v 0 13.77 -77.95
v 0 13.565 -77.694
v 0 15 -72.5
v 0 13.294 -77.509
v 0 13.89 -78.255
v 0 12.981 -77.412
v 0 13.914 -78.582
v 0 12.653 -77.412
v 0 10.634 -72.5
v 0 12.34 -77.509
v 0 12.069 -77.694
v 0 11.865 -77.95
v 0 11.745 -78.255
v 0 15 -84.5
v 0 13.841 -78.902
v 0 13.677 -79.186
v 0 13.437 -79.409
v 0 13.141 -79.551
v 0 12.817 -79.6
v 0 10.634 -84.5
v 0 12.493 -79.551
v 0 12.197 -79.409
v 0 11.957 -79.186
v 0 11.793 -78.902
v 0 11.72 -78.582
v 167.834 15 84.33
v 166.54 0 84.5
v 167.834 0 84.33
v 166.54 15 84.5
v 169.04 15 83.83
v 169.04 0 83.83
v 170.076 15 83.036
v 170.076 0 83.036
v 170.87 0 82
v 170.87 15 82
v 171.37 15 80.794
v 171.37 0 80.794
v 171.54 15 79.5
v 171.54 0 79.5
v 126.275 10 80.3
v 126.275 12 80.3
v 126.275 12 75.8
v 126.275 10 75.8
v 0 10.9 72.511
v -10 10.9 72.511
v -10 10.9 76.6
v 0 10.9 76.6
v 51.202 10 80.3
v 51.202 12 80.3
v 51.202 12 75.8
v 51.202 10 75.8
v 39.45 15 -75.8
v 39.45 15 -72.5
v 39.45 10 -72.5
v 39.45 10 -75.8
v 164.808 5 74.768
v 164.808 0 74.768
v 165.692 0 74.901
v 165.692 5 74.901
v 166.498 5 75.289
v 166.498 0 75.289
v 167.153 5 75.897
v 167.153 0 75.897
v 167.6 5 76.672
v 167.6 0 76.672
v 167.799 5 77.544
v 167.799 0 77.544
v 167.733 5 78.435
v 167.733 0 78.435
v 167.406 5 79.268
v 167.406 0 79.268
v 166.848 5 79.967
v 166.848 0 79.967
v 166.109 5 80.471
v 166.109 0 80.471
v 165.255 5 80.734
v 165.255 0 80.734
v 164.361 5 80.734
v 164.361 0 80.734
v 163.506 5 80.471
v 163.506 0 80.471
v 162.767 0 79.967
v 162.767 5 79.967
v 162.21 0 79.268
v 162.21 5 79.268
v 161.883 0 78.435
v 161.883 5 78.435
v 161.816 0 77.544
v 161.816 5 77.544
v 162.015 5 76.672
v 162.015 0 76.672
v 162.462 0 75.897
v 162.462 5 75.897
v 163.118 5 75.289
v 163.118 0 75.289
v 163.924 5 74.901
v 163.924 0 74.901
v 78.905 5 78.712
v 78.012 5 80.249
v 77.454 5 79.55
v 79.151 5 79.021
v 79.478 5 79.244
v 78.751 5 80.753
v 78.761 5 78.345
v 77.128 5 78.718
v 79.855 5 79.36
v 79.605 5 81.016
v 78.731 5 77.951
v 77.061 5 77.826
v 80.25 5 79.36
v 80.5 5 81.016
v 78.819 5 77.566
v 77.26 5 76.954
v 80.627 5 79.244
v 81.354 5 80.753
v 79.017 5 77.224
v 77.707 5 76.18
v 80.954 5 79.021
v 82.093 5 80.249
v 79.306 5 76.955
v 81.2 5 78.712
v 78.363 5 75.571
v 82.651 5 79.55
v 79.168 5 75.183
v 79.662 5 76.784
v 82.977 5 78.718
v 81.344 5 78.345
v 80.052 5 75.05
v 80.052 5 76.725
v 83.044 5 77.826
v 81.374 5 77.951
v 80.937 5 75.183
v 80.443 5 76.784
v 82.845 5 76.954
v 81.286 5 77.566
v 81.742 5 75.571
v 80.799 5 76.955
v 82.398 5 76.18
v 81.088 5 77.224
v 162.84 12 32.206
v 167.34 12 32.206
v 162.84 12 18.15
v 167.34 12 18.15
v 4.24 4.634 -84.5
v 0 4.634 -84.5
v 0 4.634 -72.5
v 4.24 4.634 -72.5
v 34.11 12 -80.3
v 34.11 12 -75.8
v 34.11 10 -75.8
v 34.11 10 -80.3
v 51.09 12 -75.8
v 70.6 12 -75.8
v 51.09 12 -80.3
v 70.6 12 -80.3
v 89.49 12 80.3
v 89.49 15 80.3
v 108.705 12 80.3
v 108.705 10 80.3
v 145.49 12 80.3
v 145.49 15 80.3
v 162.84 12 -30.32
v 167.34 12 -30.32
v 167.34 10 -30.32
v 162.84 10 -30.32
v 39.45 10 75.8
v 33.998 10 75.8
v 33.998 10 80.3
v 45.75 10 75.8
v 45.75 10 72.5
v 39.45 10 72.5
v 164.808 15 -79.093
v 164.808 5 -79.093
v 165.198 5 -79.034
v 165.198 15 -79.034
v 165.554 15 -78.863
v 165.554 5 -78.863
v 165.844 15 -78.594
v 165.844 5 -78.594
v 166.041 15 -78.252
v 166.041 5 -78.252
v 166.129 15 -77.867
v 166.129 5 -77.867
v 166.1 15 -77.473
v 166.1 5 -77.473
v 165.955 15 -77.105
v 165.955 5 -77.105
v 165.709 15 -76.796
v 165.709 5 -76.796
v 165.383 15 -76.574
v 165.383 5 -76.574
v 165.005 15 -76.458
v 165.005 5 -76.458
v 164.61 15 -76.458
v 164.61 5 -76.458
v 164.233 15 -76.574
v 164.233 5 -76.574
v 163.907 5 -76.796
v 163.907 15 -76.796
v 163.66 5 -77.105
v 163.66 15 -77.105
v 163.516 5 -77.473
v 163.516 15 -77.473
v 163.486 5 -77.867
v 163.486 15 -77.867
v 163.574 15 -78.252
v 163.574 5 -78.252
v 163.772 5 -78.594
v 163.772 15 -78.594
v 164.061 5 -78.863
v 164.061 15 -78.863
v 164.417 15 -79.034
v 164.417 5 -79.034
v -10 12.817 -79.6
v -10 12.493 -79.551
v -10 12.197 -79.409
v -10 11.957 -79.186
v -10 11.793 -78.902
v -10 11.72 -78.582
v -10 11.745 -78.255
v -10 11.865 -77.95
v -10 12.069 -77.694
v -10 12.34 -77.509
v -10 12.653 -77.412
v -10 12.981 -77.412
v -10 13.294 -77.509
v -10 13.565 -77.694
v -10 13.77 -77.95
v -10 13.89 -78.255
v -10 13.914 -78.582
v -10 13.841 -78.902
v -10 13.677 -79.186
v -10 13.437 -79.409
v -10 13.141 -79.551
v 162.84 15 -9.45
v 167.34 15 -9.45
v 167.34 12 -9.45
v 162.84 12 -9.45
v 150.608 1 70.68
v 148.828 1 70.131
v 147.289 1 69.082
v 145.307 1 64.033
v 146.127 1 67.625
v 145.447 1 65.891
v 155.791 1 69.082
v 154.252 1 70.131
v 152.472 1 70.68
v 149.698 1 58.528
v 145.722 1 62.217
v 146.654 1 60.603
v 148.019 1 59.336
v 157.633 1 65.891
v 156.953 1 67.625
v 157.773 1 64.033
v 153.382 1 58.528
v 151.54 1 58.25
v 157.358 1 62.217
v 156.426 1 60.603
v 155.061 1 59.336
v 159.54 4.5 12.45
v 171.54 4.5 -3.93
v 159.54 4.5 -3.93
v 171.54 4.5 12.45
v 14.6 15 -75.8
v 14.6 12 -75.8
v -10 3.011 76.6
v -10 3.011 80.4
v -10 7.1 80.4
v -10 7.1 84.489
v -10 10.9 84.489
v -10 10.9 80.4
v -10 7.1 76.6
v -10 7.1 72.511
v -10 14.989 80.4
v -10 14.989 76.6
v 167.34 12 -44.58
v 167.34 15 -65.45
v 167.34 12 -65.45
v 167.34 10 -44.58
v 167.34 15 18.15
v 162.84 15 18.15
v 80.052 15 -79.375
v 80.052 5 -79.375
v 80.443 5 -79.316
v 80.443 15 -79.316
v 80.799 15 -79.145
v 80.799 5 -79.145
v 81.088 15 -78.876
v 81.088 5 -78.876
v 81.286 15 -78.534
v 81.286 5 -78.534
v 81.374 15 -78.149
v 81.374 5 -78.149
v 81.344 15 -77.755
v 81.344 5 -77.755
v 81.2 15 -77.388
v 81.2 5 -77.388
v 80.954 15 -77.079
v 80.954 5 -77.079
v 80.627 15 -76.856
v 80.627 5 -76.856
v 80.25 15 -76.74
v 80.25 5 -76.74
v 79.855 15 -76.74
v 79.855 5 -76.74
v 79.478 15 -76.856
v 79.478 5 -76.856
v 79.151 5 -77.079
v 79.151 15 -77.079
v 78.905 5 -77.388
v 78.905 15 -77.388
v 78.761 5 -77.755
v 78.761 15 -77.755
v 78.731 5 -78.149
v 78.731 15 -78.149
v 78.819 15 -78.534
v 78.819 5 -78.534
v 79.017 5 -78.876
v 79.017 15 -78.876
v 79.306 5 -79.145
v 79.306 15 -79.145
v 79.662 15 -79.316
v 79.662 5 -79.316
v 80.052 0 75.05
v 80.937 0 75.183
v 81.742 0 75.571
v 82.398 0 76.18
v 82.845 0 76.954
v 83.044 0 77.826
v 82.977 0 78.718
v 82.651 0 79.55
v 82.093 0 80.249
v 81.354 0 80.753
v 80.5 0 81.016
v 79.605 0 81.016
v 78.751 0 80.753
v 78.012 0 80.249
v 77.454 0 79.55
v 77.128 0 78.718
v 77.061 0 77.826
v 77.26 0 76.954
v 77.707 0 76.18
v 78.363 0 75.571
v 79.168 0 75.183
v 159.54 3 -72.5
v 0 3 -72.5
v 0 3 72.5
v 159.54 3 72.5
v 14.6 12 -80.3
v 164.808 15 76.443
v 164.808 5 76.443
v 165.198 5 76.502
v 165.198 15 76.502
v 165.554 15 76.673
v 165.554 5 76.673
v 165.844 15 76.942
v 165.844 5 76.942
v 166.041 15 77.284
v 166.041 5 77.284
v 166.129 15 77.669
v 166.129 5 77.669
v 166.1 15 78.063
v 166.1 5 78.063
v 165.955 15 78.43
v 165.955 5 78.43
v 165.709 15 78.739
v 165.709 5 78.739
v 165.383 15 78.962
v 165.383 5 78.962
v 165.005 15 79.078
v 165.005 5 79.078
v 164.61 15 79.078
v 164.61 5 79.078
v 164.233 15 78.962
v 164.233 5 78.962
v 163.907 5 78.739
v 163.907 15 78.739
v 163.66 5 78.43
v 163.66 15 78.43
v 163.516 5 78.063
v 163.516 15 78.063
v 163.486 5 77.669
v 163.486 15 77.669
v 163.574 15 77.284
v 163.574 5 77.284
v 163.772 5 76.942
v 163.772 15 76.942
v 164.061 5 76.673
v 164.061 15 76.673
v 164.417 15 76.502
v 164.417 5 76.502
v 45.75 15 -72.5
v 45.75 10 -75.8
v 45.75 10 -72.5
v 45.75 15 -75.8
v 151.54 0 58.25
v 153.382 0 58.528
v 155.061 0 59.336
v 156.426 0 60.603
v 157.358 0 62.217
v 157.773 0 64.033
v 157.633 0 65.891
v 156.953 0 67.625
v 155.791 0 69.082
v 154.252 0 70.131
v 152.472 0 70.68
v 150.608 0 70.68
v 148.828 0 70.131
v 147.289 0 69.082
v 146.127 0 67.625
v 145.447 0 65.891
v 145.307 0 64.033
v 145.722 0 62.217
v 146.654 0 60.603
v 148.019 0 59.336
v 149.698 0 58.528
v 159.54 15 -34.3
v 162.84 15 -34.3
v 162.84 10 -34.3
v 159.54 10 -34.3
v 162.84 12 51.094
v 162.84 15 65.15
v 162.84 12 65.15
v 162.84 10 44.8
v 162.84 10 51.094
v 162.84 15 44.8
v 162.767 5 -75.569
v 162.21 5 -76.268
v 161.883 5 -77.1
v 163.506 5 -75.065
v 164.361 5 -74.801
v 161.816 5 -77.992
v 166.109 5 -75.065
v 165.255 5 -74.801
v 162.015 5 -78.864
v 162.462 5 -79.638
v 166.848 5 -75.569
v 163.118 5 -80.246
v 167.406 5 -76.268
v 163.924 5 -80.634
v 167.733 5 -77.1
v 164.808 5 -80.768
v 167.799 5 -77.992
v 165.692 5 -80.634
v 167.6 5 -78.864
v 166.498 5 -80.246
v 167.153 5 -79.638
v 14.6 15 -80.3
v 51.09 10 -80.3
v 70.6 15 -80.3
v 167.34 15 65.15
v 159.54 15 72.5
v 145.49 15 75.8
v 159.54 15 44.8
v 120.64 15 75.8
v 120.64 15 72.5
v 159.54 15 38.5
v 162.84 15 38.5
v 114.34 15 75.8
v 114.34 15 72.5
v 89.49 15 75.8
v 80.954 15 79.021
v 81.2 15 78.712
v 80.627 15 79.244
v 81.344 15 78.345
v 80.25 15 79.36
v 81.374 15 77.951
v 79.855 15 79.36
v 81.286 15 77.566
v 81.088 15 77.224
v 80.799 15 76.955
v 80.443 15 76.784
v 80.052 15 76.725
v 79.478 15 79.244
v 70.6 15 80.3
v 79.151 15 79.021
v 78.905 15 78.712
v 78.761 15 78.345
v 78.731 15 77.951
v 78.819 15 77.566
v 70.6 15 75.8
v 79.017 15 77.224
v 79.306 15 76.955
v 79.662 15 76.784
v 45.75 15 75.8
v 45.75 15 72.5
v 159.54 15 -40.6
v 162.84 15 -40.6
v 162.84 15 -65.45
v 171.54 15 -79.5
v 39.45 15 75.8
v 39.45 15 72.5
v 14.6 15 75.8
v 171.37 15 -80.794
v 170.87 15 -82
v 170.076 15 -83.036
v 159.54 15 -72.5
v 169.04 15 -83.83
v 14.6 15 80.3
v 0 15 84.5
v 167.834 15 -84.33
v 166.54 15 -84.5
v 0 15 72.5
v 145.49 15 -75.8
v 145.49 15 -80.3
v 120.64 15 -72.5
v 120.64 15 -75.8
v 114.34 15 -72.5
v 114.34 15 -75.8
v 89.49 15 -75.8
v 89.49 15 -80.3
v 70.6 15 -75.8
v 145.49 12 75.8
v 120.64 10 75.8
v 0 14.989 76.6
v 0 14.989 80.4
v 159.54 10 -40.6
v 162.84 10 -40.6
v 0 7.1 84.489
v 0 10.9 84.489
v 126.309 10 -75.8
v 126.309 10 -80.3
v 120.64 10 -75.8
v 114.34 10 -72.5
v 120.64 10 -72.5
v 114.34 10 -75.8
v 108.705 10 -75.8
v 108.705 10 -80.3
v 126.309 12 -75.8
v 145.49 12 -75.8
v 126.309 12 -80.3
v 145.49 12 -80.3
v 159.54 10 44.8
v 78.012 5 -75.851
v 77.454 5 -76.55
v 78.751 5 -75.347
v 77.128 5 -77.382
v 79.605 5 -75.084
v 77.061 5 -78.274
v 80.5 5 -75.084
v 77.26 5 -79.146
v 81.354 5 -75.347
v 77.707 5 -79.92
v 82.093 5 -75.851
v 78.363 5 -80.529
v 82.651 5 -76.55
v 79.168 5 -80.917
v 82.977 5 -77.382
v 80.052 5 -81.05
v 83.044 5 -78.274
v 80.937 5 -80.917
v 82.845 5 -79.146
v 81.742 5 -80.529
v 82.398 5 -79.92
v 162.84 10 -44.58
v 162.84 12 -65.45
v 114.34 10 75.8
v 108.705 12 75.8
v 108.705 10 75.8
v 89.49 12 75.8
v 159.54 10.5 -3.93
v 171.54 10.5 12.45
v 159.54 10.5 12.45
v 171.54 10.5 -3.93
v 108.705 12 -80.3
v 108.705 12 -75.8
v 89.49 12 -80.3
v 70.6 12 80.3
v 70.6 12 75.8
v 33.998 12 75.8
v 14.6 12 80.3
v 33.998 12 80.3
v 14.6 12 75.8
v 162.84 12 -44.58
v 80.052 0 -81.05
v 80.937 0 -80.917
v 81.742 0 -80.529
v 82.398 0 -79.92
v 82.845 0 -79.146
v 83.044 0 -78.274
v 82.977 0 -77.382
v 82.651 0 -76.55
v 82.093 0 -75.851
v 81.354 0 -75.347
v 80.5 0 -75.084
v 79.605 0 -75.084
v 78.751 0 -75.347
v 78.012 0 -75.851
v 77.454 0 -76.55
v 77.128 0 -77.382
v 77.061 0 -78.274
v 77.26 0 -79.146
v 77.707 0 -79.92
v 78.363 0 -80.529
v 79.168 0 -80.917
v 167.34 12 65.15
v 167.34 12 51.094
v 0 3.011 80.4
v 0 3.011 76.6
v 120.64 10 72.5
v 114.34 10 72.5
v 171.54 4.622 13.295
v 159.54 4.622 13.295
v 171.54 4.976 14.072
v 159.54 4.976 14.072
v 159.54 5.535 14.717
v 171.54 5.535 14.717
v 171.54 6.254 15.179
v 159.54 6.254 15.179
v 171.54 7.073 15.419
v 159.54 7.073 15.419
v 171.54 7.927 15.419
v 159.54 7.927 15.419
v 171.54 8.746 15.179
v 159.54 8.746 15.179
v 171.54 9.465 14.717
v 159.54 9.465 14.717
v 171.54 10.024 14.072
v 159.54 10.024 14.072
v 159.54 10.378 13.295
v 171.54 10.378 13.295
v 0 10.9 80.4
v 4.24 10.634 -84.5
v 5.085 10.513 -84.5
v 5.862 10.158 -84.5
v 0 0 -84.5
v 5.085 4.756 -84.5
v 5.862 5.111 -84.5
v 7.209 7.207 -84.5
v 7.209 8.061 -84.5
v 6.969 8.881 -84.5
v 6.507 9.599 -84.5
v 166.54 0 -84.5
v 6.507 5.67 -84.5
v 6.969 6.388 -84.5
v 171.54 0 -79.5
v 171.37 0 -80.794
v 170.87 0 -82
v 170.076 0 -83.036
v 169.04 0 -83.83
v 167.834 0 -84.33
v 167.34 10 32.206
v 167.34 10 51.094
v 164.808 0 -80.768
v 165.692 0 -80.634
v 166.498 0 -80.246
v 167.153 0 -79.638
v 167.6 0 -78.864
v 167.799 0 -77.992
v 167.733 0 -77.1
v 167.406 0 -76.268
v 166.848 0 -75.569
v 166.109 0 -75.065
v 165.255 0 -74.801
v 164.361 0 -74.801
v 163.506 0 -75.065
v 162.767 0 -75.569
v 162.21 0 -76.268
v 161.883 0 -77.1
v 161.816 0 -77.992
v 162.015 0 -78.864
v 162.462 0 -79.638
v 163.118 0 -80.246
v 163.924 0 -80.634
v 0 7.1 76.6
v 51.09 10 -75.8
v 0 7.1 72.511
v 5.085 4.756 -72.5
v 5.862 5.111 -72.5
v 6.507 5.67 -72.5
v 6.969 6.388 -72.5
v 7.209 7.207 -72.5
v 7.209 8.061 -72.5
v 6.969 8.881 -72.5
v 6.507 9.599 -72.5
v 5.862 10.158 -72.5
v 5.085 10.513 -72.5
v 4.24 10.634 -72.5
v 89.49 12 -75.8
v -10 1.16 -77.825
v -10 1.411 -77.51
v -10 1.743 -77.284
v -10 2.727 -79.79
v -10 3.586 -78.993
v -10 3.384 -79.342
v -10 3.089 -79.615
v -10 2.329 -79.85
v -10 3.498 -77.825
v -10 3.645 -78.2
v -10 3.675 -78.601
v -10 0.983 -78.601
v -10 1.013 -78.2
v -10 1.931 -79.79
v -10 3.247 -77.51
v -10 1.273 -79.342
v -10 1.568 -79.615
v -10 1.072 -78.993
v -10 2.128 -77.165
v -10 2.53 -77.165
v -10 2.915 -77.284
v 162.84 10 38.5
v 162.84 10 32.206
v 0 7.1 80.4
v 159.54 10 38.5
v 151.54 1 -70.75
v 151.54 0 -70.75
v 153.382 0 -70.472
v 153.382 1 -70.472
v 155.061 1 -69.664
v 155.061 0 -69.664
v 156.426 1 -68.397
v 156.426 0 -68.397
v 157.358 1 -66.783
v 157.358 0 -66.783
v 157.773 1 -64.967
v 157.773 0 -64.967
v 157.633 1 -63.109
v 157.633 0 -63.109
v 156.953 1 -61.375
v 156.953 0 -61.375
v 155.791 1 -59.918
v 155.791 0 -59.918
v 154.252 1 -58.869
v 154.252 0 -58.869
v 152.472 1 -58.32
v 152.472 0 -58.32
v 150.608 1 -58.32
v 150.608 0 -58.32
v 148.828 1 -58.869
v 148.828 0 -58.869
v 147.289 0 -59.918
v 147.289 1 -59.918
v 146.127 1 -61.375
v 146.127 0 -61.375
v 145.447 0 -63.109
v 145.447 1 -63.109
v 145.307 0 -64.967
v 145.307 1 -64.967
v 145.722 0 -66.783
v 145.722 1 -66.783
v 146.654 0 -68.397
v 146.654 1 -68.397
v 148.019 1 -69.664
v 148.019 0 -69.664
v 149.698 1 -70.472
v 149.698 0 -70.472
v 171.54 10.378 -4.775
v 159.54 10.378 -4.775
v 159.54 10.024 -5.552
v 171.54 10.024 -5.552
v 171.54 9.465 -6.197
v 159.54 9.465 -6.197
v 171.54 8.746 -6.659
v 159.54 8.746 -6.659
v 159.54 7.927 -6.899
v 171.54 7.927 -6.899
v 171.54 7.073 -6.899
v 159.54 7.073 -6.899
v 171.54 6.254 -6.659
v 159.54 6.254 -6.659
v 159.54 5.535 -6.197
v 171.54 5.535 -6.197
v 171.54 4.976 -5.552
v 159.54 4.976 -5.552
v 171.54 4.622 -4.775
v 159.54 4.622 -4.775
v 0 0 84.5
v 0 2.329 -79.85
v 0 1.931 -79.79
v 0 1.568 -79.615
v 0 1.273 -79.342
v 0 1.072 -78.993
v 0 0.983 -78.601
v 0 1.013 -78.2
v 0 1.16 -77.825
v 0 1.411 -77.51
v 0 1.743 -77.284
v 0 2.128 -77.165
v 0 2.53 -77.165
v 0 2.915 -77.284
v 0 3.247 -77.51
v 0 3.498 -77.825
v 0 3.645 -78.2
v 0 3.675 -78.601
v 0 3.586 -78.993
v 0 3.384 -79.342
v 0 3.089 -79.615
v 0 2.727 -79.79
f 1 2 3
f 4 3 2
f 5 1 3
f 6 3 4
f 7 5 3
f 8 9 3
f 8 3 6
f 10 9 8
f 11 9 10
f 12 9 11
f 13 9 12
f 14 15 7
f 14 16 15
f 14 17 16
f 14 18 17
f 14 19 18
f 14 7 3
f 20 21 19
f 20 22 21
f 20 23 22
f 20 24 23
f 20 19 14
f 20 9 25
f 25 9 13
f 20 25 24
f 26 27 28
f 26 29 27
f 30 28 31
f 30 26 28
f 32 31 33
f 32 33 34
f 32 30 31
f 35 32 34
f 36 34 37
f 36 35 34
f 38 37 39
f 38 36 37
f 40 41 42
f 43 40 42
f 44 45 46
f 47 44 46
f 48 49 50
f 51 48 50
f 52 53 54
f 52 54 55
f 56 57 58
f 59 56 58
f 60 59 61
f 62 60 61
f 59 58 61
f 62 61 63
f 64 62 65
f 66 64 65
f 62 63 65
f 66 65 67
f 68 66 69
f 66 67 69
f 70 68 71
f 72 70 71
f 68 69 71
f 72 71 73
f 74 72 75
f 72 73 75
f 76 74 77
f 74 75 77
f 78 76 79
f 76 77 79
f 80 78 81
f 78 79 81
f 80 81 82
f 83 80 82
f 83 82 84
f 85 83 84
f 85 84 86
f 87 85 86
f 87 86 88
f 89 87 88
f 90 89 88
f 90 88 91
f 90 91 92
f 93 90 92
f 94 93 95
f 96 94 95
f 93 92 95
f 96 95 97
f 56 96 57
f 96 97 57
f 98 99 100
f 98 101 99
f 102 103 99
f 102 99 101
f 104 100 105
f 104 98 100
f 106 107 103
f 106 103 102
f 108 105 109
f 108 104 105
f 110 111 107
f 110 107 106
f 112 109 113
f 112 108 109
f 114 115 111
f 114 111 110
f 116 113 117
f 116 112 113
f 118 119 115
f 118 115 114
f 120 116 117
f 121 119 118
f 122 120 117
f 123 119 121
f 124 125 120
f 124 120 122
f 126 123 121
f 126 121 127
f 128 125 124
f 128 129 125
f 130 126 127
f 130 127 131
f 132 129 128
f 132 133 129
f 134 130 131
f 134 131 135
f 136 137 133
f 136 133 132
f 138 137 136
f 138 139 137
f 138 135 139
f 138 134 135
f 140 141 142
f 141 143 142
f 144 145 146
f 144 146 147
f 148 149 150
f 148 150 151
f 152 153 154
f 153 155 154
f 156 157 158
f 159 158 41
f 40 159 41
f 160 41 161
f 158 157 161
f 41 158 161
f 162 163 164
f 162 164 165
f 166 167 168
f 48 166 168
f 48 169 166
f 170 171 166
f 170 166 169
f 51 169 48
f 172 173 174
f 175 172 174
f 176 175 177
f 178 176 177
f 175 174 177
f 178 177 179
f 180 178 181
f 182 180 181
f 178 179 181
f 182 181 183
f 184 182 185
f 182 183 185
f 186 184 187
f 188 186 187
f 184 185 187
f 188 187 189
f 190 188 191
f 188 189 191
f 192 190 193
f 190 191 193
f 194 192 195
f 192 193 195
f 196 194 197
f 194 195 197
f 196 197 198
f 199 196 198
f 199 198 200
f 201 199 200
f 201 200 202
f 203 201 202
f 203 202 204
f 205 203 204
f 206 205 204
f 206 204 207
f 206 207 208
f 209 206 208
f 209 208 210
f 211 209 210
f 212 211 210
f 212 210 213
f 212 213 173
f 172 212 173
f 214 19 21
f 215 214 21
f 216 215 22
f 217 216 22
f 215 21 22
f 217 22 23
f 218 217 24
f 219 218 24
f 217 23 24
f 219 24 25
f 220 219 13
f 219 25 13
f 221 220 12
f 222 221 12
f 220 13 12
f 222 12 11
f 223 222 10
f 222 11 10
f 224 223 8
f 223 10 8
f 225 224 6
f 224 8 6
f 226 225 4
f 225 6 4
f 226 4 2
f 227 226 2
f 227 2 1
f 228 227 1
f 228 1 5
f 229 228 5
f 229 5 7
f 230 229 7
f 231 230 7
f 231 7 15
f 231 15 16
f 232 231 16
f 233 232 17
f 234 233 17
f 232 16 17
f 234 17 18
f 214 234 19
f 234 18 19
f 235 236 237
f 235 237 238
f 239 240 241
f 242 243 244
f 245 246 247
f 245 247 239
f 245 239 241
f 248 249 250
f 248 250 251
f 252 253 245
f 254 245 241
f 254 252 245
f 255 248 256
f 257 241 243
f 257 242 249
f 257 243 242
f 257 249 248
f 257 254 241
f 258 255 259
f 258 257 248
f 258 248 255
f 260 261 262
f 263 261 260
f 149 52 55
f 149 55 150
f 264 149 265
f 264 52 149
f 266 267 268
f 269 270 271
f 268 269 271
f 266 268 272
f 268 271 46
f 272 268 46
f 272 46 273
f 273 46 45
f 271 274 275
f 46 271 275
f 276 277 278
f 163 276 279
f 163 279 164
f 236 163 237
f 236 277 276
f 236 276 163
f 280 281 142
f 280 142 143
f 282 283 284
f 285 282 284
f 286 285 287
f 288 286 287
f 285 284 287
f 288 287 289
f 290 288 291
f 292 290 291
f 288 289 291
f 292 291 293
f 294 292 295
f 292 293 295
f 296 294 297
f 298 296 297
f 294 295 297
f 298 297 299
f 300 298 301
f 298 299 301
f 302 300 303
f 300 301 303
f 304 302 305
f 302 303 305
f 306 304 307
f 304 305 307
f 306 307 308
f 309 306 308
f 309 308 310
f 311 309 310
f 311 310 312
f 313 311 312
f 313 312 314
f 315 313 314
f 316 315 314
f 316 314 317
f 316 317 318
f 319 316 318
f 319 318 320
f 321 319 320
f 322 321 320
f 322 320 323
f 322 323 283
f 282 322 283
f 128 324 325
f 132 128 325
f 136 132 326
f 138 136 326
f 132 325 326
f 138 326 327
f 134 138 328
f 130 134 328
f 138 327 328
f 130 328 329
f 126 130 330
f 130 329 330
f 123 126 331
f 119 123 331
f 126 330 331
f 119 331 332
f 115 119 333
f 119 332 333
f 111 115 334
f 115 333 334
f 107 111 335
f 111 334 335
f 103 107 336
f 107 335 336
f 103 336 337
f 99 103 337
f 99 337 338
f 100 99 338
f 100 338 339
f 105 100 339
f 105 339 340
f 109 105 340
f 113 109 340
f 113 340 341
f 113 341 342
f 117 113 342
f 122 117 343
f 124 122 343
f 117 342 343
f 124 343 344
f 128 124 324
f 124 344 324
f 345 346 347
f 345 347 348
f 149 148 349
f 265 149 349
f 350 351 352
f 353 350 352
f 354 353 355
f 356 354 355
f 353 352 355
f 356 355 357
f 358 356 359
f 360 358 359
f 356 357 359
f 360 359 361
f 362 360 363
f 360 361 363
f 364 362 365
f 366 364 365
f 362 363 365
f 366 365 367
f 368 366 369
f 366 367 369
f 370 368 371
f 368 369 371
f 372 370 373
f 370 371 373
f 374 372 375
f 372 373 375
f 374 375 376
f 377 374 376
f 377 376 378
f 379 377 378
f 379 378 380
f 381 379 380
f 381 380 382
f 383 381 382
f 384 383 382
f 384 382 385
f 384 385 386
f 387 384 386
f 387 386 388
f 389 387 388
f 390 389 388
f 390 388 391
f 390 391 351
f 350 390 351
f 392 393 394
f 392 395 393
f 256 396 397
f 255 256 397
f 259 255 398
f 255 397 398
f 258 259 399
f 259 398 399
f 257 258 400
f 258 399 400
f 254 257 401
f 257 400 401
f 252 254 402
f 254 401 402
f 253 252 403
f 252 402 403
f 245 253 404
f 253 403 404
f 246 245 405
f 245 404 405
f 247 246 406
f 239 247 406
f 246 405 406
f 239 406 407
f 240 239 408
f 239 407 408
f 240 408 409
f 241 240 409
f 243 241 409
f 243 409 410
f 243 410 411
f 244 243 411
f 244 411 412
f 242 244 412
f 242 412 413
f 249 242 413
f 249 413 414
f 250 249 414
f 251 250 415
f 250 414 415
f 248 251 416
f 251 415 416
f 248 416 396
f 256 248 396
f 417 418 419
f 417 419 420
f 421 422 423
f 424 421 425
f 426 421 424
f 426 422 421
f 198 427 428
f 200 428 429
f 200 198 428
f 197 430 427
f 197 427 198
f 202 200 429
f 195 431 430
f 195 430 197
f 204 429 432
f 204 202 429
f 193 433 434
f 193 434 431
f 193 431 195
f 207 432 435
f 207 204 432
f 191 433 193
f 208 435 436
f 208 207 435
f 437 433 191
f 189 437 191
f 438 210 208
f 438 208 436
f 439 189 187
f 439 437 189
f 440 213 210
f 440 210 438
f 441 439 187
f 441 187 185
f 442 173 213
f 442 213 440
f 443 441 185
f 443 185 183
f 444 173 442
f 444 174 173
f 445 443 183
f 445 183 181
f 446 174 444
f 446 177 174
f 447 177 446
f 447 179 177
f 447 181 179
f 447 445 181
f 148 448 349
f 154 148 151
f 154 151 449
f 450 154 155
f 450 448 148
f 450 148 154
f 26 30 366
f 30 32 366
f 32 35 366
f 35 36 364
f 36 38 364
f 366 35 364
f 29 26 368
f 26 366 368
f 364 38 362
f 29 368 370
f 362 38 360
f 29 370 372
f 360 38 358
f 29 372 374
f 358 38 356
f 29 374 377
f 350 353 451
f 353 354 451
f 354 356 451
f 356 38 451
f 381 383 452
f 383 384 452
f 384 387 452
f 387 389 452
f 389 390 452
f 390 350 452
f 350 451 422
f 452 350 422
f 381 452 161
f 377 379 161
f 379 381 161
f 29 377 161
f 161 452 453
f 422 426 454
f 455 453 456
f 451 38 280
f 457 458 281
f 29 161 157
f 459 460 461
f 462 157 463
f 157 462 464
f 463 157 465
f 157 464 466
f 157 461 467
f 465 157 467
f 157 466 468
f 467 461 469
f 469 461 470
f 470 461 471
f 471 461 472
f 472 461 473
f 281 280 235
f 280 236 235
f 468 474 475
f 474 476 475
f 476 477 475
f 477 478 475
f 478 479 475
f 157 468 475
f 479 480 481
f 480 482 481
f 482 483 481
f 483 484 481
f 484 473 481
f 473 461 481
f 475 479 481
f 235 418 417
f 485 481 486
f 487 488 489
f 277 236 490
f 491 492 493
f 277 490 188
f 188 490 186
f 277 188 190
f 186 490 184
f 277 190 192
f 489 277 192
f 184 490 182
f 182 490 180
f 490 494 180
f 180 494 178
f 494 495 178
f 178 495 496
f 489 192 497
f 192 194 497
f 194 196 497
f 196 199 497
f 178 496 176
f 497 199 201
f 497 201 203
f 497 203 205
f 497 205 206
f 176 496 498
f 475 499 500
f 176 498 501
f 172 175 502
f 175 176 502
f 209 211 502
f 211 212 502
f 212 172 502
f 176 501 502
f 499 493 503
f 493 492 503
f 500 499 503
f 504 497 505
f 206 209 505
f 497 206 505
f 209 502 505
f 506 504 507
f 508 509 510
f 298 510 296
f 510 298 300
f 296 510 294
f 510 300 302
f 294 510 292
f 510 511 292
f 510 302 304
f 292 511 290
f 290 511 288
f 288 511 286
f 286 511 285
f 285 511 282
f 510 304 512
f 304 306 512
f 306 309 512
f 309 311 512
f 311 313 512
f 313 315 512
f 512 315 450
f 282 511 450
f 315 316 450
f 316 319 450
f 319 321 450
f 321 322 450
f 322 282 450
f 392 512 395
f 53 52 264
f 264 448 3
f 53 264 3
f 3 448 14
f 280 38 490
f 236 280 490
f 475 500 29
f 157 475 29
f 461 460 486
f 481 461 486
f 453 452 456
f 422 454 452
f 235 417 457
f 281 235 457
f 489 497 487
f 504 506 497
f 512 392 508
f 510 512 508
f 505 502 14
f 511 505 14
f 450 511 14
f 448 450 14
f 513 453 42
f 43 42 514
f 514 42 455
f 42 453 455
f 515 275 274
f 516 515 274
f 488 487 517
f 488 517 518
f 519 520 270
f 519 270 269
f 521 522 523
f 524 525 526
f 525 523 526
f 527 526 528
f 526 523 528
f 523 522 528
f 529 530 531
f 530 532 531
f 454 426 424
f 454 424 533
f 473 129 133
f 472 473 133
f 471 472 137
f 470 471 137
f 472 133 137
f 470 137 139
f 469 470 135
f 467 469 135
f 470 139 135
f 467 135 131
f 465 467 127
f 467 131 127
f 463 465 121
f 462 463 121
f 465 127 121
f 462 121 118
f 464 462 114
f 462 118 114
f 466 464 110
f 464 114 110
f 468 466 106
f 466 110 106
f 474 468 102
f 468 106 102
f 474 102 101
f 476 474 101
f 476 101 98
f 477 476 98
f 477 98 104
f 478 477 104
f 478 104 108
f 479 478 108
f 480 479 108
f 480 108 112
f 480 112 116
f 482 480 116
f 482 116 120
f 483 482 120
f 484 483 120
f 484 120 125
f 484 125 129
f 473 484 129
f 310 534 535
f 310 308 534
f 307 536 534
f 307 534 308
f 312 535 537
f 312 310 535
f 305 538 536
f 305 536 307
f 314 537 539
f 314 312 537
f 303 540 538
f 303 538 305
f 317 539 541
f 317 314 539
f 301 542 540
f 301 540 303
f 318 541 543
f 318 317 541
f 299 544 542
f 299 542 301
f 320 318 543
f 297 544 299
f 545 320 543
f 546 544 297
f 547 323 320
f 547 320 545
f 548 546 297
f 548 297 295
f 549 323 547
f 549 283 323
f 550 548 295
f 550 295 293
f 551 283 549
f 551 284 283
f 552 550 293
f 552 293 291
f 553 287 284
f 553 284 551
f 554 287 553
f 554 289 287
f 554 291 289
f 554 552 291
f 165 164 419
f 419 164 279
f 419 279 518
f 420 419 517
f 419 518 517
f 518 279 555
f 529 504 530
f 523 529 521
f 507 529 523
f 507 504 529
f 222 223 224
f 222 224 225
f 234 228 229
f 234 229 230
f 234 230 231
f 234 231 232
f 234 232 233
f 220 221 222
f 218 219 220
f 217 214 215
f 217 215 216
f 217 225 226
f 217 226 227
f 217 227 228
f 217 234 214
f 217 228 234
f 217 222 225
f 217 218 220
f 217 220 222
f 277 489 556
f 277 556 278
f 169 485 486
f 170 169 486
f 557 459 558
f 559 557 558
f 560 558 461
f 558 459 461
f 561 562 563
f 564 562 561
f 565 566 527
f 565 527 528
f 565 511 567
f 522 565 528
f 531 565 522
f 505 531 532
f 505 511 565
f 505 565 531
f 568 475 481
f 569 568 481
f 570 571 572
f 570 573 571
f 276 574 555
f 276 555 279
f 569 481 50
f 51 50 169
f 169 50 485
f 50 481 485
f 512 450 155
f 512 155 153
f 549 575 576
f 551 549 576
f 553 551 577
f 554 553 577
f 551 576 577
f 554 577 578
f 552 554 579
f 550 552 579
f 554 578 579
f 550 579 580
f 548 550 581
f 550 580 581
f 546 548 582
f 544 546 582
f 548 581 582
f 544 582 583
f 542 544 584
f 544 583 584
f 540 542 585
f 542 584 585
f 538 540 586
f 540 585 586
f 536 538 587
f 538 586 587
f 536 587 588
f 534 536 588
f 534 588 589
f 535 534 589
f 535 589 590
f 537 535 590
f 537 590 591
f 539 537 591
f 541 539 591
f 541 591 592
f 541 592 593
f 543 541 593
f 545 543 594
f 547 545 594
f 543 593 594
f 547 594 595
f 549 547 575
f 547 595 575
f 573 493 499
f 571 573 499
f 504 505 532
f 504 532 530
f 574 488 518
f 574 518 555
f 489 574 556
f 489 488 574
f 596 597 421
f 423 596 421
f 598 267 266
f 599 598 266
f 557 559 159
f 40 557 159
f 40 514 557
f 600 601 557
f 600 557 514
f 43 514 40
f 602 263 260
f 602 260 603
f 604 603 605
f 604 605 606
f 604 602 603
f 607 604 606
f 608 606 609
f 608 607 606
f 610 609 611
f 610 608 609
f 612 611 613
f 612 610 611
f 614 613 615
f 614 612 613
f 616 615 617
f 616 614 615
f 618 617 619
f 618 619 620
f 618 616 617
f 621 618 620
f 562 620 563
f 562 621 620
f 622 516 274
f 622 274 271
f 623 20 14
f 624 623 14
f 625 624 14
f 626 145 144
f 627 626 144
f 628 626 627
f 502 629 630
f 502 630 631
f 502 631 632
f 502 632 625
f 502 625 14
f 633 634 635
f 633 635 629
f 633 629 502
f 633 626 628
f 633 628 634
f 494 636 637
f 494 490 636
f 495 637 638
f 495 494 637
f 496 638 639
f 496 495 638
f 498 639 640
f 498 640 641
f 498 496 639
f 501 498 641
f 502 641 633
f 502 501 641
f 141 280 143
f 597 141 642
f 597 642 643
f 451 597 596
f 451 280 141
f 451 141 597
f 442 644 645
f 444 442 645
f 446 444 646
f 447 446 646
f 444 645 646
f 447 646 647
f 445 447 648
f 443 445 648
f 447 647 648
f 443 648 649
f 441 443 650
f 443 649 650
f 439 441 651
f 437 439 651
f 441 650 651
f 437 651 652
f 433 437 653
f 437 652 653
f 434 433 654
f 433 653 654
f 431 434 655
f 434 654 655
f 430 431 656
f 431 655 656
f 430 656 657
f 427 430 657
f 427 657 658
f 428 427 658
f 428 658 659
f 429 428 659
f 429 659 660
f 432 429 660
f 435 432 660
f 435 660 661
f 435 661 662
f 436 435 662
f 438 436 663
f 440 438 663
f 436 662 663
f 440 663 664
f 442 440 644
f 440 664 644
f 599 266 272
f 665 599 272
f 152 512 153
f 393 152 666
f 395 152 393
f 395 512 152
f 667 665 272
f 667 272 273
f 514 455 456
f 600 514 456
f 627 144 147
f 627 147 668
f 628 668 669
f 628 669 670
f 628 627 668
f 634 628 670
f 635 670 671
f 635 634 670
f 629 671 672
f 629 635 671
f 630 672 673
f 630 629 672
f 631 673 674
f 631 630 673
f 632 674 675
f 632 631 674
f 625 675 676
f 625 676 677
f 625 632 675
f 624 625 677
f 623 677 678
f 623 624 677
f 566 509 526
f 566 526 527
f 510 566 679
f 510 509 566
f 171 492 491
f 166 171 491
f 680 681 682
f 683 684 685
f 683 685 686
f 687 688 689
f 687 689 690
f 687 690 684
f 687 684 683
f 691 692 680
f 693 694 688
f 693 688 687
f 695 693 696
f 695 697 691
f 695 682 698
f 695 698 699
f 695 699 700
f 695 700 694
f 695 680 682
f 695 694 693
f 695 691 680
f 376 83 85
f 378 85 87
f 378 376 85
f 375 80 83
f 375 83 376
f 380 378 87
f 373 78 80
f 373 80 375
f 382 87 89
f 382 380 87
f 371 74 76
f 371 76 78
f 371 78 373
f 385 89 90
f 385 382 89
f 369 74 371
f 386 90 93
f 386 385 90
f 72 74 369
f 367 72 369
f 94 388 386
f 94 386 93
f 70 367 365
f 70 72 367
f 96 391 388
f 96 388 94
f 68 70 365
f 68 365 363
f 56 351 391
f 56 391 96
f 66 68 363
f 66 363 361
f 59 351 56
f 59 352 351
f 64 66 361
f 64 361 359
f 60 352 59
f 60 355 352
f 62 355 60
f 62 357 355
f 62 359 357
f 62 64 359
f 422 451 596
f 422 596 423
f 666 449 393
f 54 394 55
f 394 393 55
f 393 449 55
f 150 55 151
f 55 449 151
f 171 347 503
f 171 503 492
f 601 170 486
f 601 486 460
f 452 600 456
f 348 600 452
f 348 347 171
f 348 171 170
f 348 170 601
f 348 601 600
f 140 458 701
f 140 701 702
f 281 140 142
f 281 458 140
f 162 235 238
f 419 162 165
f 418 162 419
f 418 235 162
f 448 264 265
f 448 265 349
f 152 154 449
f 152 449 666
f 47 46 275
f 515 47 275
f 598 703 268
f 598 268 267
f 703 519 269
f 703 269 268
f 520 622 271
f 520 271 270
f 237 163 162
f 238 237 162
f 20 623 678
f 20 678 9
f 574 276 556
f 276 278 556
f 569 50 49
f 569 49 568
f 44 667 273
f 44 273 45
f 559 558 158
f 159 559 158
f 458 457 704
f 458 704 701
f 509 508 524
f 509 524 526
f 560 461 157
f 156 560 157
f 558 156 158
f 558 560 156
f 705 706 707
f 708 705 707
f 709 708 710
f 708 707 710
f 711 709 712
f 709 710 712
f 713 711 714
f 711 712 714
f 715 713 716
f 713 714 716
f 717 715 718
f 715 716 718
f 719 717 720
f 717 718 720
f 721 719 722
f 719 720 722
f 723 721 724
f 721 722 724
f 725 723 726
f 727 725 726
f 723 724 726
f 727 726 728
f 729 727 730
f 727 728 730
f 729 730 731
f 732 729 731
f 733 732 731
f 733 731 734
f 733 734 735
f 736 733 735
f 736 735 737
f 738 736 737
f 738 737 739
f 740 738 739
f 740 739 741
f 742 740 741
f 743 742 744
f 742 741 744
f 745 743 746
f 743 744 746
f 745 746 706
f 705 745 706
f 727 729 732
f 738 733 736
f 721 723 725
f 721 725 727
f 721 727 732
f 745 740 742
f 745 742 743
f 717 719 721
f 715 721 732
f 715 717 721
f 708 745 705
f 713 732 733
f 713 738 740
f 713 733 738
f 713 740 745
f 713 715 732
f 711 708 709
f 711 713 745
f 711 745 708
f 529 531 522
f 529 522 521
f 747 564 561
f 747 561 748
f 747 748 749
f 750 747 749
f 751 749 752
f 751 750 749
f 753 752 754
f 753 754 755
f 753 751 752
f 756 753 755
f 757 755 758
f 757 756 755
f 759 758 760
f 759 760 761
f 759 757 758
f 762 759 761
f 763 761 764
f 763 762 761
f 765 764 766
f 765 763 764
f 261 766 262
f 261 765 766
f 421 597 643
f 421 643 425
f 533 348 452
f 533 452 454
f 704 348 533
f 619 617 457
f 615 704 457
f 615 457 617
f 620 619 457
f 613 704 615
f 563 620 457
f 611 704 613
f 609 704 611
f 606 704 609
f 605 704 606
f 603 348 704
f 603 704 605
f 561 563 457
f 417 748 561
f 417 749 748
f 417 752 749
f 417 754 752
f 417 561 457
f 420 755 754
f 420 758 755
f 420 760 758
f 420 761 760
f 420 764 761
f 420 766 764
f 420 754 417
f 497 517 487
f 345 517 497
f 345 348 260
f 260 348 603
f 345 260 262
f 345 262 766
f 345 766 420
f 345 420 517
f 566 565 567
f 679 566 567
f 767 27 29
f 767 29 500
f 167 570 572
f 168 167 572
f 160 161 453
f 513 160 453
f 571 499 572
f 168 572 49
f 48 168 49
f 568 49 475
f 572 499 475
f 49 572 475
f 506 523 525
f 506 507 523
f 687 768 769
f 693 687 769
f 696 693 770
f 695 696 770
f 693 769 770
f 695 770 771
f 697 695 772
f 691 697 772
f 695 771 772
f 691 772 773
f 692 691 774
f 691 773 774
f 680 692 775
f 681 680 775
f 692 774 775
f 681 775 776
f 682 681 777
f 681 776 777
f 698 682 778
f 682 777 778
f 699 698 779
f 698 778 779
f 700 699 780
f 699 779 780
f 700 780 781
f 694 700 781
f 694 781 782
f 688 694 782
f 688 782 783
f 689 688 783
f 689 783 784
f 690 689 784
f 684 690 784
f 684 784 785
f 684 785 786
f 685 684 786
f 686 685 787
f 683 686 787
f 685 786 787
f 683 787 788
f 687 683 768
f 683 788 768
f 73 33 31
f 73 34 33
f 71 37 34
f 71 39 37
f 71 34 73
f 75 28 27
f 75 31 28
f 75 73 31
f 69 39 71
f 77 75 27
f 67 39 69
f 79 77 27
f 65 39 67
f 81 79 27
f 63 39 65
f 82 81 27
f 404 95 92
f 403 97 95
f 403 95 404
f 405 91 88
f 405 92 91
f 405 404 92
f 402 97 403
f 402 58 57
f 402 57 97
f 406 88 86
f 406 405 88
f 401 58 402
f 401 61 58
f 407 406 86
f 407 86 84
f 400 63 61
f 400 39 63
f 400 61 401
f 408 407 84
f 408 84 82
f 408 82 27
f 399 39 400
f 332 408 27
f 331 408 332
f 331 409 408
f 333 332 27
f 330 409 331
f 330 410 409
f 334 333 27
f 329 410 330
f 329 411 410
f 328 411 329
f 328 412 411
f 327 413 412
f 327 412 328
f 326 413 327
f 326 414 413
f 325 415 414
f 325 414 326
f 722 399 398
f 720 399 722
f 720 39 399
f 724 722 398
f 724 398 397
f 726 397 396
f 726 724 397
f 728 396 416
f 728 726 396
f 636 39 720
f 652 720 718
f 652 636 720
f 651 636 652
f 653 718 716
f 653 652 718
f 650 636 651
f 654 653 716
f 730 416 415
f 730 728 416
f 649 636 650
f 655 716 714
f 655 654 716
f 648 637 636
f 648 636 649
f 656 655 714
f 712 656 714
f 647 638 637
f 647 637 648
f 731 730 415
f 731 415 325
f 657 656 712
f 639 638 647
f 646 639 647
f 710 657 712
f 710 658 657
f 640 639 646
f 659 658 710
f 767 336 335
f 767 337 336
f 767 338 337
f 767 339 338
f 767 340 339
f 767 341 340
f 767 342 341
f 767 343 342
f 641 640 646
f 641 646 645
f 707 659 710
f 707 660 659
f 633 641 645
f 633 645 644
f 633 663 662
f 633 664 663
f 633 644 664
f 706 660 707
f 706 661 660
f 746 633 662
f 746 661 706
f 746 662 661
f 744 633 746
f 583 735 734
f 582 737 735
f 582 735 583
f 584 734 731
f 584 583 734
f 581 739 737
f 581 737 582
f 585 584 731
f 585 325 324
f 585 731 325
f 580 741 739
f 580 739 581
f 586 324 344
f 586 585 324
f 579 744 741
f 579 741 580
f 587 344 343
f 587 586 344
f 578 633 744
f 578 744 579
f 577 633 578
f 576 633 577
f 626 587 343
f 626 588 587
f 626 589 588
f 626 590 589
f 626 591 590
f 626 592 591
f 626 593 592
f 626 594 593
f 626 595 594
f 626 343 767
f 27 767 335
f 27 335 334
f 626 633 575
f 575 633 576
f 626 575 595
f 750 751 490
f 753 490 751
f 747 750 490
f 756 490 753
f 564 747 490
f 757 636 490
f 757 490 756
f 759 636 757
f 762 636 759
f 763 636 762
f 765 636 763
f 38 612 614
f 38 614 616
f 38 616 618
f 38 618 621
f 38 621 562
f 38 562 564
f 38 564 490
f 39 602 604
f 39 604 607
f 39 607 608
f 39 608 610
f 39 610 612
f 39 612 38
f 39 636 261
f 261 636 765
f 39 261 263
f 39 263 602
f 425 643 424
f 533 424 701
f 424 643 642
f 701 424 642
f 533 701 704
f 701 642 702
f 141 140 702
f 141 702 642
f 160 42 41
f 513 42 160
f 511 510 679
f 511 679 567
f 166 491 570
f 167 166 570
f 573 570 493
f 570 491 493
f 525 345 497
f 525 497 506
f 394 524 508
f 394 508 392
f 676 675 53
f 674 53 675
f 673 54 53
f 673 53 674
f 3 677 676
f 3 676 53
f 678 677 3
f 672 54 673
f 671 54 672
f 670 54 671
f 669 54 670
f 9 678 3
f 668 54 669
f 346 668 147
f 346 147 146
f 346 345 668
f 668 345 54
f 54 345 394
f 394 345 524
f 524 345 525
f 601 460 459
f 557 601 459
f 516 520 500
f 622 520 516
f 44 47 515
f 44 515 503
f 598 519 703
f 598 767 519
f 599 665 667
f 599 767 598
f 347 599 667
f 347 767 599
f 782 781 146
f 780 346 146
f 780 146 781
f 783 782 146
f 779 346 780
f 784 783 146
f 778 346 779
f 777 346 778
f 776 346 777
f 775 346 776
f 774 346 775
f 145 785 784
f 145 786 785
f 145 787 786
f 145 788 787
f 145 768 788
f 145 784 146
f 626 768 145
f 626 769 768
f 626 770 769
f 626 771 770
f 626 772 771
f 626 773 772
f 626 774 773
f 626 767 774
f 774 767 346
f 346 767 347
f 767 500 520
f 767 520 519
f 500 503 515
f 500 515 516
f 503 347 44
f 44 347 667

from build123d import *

# Parameters (mm, degrees)
SKETCH1_W           = 159.54
SKETCH1_H           = 145
BOSS_EXTRUDE1_DEPTH = 3
BOSS_EXTRUDE2_DEPTH = 15
CUT_EXTRUDE1_DEPTH  = 3
CUT_EXTRUDE2_DEPTH  = 2
CUT_EXTRUDE3_DEPTH  = 12
CUT_EXTRUDE4_DEPTH  = 12
SKETCH8_R           = 1.1
SKETCH8_R_2         = 1.35
BOSS_EXTRUDE3_DEPTH = 10
BOSS_EXTRUDE5_DEPTH = 10
FILLET3_R           = 5
FILLET4_R           = 5
SKETCH10_R          = 1.325
CUT_EXTRUDE5_DEPTH  = 17
SKETCH12_R          = 3
CUT_EXTRUDE6_DEPTH  = 5
SKETCH13_R          = 6.25
CUT_EXTRUDE7_DEPTH  = 1


with BuildPart() as part:
    # Sketch1 → Boss-Extrude1 (new body)
    with BuildSketch(Plane(origin=(0, 0, 0), x_dir=(1, 0, 0), z_dir=(0, 1, 0))):
        with Locations((79.77, 0)):
            Rectangle(SKETCH1_W, SKETCH1_H)
    extrude(amount=BOSS_EXTRUDE1_DEPTH)

    # Sketch3 → Boss-Extrude2 (add)
    with BuildSketch(Plane(origin=(0, 0, 0), x_dir=(1, 0, 0), z_dir=(0, 1, 0))):
        Polygon((0, 72.5), (0, 84.5), (171.54, 84.5), (171.54, -84.5), (0, -84.5), (0, -72.5), (159.54, -72.5), (159.54, 72.5), align=None)
    extrude(amount=BOSS_EXTRUDE2_DEPTH)

    # Sketch4 → Cut-Extrude1 (cut)
    with BuildSketch(Plane(origin=(0, 15, 0), x_dir=(1, 0, 0), z_dir=(0, 1, 0))):
        Polygon((45.75, 75.8), (45.75, 72.5), (39.45, 72.5), (39.45, 75.8), (14.6, 75.8), (14.6, 80.3), (70.6, 80.3), (70.6, 75.8), align=None)
        Polygon((120.64, 75.8), (120.64, 72.5), (114.34, 72.5), (114.34, 75.8), (89.49, 75.8), (89.49, 80.3), (145.49, 80.3), (145.49, 75.8), align=None)
        Polygon((145.49, -75.8), (120.64, -75.8), (120.64, -72.5), (114.34, -72.5), (114.34, -75.8), (89.49, -75.8), (89.49, -80.3), (145.49, -80.3), align=None)
        Polygon((70.6, -75.8), (45.75, -75.8), (45.75, -72.5), (39.45, -72.5), (39.45, -75.8), (14.6, -75.8), (14.6, -80.3), (70.6, -80.3), align=None)
        Polygon((159.54, -38.5), (162.84, -38.5), (162.84, -18.15), (167.34, -18.15), (167.34, -65.15), (162.84, -65.15), (162.84, -44.8), (159.54, -44.8), align=None)
        Polygon((159.54, 40.6), (162.84, 40.6), (162.84, 65.45), (167.34, 65.45), (167.34, 9.45), (162.84, 9.45), (162.84, 34.3), (159.54, 34.3), align=None)
    extrude(amount=-CUT_EXTRUDE1_DEPTH, mode=Mode.SUBTRACT)

    # Sketch5 → Cut-Extrude2 (cut)
    with BuildSketch(Plane(origin=(0, 12, 0), x_dir=(1, 0, 0), z_dir=(0, 1, 0))):
        Polygon((39.45, -72.5), (39.45, -75.8), (33.99806762, -75.8), (33.99806762, -80.3), (51.20193238, -80.3), (51.20193238, -75.8), (45.75, -75.8), (45.75, -72.5), align=None)
        Polygon((114.34, -75.8), (108.704865037, -75.8), (108.704865037, -80.3), (126.275134963, -80.3), (126.275134963, -75.8), (120.64, -75.8), (120.64, -72.5), (114.34, -72.5), align=None)
        Polygon((120.64, 72.5), (114.34, 72.5), (114.34, 75.8), (108.704865037, 75.8), (108.704865037, 80.3), (126.308635122, 80.3), (126.308635122, 75.8), (120.64, 75.8), align=None)
        Polygon((45.75, 72.5), (39.45, 72.5), (39.45, 75.8), (34.110302497, 75.8), (34.110302497, 80.3), (51.089697503, 80.3), (51.089697503, 75.8), (45.75, 75.8), align=None)
        Polygon((159.54, -44.8), (159.54, -38.5), (162.84, -38.5), (162.84, -32.205861204), (167.34, -32.205861204), (167.34, -51.094138796), (162.84, -51.094138796), (162.84, -44.8), align=None)
        Polygon((159.54, 40.6), (162.84, 40.6), (162.84, 44.579740263), (167.34, 44.579740263), (167.34, 30.320259737), (162.84, 30.320259737), (162.84, 34.3), (159.54, 34.3), align=None)
    extrude(amount=-CUT_EXTRUDE2_DEPTH, mode=Mode.SUBTRACT)

    # Sketch6 → Cut-Extrude3 (cut)
    with BuildSketch(Plane(origin=(171.54, 0, 0), x_dir=(0, 0, -1), z_dir=(1, 0, 0))):
        with BuildLine():
            Line((-12.45, 10.5), (3.93, 10.5))
            ThreePointArc((3.93, 10.5), (6.93, 7.5), (3.93, 4.5))
            Line((3.93, 4.5), (-12.45, 4.5))
            ThreePointArc((-12.45, 4.5), (-15.45, 7.5), (-12.45, 10.5))
        make_face()
    extrude(amount=-CUT_EXTRUDE3_DEPTH, mode=Mode.SUBTRACT)

    # Sketch7 → Cut-Extrude4 (cut)
    with BuildSketch(Plane(origin=(0, 0, -84.5), x_dir=(-1, 0, 0), z_dir=(0, 0, -1))):
        with BuildLine():
            Line((-4.24, 10.6343), (12.14, 10.6343))
            ThreePointArc((12.14, 10.6343), (15.14, 7.6343), (12.14, 4.6343))
            Line((12.14, 4.6343), (-4.24, 4.6343))
            ThreePointArc((-4.24, 4.6343), (-7.24, 7.6343), (-4.24, 10.6343))
        make_face()
    extrude(amount=-CUT_EXTRUDE4_DEPTH, mode=Mode.SUBTRACT)

    # Sketch8 → Boss-Extrude3 (add)
    with BuildSketch(Plane.ZY):
        with Locations(Location((-78.5, 12.81715, 0), (0, 0, 180))):
            Circle(SKETCH8_R)
        with Locations(Location((-78.5, 2.328843142, 0), (0, 0, 180))):
            Circle(SKETCH8_R_2)
    extrude(amount=BOSS_EXTRUDE3_DEPTH)

    # Sketch9 → Boss-Extrude5 (add)
    with BuildSketch(Plane.ZY):
        Polygon((76.6, 14.98895691), (80.4, 14.98895691), (80.4, 10.9), (84.489160504, 10.9), (84.489160504, 7.1), (80.4, 7.1), (80.4, 3.01104309), (76.6, 3.01104309), (76.6, 7.100000004), (72.511375857, 7.100000004), (72.511117499, 10.899999996), (76.6, 10.899999996), align=None)
    extrude(amount=BOSS_EXTRUDE5_DEPTH)

    # Fillet3
    fillet3_edges = [part.edges().sort_by_distance(p)[0] for p in [
        (171.54, 7.5, 84.5),
    ]]
    fillet(fillet3_edges, radius=FILLET3_R)

    # Fillet4
    fillet4_edges = [part.edges().sort_by_distance(p)[0] for p in [
        (171.54, 7.5, -84.5),
    ]]
    fillet(fillet4_edges, radius=FILLET4_R)

    # Sketch10 → Cut-Extrude5 (cut)
    with BuildSketch(Plane.XZ):
        with Locations(Location((80.0525, 78.05, 0), (0, 0, 270))):
            Circle(SKETCH10_R)
        with Locations(Location((164.807766953, 77.767766953, 0), (0, 0, 270))):
            Circle(SKETCH10_R)
        with Locations(Location((164.807766953, -77.767766953, 0), (0, 0, 270))):
            Circle(SKETCH10_R)
        with Locations(Location((80.0525, -78.05, 0), (0, 0, 270))):
            Circle(SKETCH10_R)
    extrude(amount=-CUT_EXTRUDE5_DEPTH, mode=Mode.SUBTRACT)

    # Sketch12 → Cut-Extrude6 (cut)
    with BuildSketch(Plane(origin=(0, 0, 0), x_dir=(-1, 0, 0), z_dir=(0, -1, 0))):
        with Locations(Location((-80.0525, -78.05, 0), (0, 0, 90))):
            Circle(SKETCH12_R)
        with Locations(Location((-164.807766953, -77.767766953, 0), (0, 0, 90))):
            Circle(SKETCH12_R)
        with Locations(Location((-164.807766953, 77.767766953, 0), (0, 0, 90))):
            Circle(SKETCH12_R)
        with Locations(Location((-80.0525, 78.05, 0), (0, 0, 90))):
            Circle(SKETCH12_R)
    extrude(amount=-CUT_EXTRUDE6_DEPTH, mode=Mode.SUBTRACT)

    # Sketch13 → Cut-Extrude7 (cut)
    with BuildSketch(Plane.XZ):
        with Locations(Location((151.54, 64.5, 0), (0, 0, 270))):
            Circle(SKETCH13_R)
        with Locations(Location((151.54, -64.5, 0), (0, 0, 270))):
            Circle(SKETCH13_R)
    extrude(amount=-CUT_EXTRUDE7_DEPTH, mode=Mode.SUBTRACT)


solid = part.part
